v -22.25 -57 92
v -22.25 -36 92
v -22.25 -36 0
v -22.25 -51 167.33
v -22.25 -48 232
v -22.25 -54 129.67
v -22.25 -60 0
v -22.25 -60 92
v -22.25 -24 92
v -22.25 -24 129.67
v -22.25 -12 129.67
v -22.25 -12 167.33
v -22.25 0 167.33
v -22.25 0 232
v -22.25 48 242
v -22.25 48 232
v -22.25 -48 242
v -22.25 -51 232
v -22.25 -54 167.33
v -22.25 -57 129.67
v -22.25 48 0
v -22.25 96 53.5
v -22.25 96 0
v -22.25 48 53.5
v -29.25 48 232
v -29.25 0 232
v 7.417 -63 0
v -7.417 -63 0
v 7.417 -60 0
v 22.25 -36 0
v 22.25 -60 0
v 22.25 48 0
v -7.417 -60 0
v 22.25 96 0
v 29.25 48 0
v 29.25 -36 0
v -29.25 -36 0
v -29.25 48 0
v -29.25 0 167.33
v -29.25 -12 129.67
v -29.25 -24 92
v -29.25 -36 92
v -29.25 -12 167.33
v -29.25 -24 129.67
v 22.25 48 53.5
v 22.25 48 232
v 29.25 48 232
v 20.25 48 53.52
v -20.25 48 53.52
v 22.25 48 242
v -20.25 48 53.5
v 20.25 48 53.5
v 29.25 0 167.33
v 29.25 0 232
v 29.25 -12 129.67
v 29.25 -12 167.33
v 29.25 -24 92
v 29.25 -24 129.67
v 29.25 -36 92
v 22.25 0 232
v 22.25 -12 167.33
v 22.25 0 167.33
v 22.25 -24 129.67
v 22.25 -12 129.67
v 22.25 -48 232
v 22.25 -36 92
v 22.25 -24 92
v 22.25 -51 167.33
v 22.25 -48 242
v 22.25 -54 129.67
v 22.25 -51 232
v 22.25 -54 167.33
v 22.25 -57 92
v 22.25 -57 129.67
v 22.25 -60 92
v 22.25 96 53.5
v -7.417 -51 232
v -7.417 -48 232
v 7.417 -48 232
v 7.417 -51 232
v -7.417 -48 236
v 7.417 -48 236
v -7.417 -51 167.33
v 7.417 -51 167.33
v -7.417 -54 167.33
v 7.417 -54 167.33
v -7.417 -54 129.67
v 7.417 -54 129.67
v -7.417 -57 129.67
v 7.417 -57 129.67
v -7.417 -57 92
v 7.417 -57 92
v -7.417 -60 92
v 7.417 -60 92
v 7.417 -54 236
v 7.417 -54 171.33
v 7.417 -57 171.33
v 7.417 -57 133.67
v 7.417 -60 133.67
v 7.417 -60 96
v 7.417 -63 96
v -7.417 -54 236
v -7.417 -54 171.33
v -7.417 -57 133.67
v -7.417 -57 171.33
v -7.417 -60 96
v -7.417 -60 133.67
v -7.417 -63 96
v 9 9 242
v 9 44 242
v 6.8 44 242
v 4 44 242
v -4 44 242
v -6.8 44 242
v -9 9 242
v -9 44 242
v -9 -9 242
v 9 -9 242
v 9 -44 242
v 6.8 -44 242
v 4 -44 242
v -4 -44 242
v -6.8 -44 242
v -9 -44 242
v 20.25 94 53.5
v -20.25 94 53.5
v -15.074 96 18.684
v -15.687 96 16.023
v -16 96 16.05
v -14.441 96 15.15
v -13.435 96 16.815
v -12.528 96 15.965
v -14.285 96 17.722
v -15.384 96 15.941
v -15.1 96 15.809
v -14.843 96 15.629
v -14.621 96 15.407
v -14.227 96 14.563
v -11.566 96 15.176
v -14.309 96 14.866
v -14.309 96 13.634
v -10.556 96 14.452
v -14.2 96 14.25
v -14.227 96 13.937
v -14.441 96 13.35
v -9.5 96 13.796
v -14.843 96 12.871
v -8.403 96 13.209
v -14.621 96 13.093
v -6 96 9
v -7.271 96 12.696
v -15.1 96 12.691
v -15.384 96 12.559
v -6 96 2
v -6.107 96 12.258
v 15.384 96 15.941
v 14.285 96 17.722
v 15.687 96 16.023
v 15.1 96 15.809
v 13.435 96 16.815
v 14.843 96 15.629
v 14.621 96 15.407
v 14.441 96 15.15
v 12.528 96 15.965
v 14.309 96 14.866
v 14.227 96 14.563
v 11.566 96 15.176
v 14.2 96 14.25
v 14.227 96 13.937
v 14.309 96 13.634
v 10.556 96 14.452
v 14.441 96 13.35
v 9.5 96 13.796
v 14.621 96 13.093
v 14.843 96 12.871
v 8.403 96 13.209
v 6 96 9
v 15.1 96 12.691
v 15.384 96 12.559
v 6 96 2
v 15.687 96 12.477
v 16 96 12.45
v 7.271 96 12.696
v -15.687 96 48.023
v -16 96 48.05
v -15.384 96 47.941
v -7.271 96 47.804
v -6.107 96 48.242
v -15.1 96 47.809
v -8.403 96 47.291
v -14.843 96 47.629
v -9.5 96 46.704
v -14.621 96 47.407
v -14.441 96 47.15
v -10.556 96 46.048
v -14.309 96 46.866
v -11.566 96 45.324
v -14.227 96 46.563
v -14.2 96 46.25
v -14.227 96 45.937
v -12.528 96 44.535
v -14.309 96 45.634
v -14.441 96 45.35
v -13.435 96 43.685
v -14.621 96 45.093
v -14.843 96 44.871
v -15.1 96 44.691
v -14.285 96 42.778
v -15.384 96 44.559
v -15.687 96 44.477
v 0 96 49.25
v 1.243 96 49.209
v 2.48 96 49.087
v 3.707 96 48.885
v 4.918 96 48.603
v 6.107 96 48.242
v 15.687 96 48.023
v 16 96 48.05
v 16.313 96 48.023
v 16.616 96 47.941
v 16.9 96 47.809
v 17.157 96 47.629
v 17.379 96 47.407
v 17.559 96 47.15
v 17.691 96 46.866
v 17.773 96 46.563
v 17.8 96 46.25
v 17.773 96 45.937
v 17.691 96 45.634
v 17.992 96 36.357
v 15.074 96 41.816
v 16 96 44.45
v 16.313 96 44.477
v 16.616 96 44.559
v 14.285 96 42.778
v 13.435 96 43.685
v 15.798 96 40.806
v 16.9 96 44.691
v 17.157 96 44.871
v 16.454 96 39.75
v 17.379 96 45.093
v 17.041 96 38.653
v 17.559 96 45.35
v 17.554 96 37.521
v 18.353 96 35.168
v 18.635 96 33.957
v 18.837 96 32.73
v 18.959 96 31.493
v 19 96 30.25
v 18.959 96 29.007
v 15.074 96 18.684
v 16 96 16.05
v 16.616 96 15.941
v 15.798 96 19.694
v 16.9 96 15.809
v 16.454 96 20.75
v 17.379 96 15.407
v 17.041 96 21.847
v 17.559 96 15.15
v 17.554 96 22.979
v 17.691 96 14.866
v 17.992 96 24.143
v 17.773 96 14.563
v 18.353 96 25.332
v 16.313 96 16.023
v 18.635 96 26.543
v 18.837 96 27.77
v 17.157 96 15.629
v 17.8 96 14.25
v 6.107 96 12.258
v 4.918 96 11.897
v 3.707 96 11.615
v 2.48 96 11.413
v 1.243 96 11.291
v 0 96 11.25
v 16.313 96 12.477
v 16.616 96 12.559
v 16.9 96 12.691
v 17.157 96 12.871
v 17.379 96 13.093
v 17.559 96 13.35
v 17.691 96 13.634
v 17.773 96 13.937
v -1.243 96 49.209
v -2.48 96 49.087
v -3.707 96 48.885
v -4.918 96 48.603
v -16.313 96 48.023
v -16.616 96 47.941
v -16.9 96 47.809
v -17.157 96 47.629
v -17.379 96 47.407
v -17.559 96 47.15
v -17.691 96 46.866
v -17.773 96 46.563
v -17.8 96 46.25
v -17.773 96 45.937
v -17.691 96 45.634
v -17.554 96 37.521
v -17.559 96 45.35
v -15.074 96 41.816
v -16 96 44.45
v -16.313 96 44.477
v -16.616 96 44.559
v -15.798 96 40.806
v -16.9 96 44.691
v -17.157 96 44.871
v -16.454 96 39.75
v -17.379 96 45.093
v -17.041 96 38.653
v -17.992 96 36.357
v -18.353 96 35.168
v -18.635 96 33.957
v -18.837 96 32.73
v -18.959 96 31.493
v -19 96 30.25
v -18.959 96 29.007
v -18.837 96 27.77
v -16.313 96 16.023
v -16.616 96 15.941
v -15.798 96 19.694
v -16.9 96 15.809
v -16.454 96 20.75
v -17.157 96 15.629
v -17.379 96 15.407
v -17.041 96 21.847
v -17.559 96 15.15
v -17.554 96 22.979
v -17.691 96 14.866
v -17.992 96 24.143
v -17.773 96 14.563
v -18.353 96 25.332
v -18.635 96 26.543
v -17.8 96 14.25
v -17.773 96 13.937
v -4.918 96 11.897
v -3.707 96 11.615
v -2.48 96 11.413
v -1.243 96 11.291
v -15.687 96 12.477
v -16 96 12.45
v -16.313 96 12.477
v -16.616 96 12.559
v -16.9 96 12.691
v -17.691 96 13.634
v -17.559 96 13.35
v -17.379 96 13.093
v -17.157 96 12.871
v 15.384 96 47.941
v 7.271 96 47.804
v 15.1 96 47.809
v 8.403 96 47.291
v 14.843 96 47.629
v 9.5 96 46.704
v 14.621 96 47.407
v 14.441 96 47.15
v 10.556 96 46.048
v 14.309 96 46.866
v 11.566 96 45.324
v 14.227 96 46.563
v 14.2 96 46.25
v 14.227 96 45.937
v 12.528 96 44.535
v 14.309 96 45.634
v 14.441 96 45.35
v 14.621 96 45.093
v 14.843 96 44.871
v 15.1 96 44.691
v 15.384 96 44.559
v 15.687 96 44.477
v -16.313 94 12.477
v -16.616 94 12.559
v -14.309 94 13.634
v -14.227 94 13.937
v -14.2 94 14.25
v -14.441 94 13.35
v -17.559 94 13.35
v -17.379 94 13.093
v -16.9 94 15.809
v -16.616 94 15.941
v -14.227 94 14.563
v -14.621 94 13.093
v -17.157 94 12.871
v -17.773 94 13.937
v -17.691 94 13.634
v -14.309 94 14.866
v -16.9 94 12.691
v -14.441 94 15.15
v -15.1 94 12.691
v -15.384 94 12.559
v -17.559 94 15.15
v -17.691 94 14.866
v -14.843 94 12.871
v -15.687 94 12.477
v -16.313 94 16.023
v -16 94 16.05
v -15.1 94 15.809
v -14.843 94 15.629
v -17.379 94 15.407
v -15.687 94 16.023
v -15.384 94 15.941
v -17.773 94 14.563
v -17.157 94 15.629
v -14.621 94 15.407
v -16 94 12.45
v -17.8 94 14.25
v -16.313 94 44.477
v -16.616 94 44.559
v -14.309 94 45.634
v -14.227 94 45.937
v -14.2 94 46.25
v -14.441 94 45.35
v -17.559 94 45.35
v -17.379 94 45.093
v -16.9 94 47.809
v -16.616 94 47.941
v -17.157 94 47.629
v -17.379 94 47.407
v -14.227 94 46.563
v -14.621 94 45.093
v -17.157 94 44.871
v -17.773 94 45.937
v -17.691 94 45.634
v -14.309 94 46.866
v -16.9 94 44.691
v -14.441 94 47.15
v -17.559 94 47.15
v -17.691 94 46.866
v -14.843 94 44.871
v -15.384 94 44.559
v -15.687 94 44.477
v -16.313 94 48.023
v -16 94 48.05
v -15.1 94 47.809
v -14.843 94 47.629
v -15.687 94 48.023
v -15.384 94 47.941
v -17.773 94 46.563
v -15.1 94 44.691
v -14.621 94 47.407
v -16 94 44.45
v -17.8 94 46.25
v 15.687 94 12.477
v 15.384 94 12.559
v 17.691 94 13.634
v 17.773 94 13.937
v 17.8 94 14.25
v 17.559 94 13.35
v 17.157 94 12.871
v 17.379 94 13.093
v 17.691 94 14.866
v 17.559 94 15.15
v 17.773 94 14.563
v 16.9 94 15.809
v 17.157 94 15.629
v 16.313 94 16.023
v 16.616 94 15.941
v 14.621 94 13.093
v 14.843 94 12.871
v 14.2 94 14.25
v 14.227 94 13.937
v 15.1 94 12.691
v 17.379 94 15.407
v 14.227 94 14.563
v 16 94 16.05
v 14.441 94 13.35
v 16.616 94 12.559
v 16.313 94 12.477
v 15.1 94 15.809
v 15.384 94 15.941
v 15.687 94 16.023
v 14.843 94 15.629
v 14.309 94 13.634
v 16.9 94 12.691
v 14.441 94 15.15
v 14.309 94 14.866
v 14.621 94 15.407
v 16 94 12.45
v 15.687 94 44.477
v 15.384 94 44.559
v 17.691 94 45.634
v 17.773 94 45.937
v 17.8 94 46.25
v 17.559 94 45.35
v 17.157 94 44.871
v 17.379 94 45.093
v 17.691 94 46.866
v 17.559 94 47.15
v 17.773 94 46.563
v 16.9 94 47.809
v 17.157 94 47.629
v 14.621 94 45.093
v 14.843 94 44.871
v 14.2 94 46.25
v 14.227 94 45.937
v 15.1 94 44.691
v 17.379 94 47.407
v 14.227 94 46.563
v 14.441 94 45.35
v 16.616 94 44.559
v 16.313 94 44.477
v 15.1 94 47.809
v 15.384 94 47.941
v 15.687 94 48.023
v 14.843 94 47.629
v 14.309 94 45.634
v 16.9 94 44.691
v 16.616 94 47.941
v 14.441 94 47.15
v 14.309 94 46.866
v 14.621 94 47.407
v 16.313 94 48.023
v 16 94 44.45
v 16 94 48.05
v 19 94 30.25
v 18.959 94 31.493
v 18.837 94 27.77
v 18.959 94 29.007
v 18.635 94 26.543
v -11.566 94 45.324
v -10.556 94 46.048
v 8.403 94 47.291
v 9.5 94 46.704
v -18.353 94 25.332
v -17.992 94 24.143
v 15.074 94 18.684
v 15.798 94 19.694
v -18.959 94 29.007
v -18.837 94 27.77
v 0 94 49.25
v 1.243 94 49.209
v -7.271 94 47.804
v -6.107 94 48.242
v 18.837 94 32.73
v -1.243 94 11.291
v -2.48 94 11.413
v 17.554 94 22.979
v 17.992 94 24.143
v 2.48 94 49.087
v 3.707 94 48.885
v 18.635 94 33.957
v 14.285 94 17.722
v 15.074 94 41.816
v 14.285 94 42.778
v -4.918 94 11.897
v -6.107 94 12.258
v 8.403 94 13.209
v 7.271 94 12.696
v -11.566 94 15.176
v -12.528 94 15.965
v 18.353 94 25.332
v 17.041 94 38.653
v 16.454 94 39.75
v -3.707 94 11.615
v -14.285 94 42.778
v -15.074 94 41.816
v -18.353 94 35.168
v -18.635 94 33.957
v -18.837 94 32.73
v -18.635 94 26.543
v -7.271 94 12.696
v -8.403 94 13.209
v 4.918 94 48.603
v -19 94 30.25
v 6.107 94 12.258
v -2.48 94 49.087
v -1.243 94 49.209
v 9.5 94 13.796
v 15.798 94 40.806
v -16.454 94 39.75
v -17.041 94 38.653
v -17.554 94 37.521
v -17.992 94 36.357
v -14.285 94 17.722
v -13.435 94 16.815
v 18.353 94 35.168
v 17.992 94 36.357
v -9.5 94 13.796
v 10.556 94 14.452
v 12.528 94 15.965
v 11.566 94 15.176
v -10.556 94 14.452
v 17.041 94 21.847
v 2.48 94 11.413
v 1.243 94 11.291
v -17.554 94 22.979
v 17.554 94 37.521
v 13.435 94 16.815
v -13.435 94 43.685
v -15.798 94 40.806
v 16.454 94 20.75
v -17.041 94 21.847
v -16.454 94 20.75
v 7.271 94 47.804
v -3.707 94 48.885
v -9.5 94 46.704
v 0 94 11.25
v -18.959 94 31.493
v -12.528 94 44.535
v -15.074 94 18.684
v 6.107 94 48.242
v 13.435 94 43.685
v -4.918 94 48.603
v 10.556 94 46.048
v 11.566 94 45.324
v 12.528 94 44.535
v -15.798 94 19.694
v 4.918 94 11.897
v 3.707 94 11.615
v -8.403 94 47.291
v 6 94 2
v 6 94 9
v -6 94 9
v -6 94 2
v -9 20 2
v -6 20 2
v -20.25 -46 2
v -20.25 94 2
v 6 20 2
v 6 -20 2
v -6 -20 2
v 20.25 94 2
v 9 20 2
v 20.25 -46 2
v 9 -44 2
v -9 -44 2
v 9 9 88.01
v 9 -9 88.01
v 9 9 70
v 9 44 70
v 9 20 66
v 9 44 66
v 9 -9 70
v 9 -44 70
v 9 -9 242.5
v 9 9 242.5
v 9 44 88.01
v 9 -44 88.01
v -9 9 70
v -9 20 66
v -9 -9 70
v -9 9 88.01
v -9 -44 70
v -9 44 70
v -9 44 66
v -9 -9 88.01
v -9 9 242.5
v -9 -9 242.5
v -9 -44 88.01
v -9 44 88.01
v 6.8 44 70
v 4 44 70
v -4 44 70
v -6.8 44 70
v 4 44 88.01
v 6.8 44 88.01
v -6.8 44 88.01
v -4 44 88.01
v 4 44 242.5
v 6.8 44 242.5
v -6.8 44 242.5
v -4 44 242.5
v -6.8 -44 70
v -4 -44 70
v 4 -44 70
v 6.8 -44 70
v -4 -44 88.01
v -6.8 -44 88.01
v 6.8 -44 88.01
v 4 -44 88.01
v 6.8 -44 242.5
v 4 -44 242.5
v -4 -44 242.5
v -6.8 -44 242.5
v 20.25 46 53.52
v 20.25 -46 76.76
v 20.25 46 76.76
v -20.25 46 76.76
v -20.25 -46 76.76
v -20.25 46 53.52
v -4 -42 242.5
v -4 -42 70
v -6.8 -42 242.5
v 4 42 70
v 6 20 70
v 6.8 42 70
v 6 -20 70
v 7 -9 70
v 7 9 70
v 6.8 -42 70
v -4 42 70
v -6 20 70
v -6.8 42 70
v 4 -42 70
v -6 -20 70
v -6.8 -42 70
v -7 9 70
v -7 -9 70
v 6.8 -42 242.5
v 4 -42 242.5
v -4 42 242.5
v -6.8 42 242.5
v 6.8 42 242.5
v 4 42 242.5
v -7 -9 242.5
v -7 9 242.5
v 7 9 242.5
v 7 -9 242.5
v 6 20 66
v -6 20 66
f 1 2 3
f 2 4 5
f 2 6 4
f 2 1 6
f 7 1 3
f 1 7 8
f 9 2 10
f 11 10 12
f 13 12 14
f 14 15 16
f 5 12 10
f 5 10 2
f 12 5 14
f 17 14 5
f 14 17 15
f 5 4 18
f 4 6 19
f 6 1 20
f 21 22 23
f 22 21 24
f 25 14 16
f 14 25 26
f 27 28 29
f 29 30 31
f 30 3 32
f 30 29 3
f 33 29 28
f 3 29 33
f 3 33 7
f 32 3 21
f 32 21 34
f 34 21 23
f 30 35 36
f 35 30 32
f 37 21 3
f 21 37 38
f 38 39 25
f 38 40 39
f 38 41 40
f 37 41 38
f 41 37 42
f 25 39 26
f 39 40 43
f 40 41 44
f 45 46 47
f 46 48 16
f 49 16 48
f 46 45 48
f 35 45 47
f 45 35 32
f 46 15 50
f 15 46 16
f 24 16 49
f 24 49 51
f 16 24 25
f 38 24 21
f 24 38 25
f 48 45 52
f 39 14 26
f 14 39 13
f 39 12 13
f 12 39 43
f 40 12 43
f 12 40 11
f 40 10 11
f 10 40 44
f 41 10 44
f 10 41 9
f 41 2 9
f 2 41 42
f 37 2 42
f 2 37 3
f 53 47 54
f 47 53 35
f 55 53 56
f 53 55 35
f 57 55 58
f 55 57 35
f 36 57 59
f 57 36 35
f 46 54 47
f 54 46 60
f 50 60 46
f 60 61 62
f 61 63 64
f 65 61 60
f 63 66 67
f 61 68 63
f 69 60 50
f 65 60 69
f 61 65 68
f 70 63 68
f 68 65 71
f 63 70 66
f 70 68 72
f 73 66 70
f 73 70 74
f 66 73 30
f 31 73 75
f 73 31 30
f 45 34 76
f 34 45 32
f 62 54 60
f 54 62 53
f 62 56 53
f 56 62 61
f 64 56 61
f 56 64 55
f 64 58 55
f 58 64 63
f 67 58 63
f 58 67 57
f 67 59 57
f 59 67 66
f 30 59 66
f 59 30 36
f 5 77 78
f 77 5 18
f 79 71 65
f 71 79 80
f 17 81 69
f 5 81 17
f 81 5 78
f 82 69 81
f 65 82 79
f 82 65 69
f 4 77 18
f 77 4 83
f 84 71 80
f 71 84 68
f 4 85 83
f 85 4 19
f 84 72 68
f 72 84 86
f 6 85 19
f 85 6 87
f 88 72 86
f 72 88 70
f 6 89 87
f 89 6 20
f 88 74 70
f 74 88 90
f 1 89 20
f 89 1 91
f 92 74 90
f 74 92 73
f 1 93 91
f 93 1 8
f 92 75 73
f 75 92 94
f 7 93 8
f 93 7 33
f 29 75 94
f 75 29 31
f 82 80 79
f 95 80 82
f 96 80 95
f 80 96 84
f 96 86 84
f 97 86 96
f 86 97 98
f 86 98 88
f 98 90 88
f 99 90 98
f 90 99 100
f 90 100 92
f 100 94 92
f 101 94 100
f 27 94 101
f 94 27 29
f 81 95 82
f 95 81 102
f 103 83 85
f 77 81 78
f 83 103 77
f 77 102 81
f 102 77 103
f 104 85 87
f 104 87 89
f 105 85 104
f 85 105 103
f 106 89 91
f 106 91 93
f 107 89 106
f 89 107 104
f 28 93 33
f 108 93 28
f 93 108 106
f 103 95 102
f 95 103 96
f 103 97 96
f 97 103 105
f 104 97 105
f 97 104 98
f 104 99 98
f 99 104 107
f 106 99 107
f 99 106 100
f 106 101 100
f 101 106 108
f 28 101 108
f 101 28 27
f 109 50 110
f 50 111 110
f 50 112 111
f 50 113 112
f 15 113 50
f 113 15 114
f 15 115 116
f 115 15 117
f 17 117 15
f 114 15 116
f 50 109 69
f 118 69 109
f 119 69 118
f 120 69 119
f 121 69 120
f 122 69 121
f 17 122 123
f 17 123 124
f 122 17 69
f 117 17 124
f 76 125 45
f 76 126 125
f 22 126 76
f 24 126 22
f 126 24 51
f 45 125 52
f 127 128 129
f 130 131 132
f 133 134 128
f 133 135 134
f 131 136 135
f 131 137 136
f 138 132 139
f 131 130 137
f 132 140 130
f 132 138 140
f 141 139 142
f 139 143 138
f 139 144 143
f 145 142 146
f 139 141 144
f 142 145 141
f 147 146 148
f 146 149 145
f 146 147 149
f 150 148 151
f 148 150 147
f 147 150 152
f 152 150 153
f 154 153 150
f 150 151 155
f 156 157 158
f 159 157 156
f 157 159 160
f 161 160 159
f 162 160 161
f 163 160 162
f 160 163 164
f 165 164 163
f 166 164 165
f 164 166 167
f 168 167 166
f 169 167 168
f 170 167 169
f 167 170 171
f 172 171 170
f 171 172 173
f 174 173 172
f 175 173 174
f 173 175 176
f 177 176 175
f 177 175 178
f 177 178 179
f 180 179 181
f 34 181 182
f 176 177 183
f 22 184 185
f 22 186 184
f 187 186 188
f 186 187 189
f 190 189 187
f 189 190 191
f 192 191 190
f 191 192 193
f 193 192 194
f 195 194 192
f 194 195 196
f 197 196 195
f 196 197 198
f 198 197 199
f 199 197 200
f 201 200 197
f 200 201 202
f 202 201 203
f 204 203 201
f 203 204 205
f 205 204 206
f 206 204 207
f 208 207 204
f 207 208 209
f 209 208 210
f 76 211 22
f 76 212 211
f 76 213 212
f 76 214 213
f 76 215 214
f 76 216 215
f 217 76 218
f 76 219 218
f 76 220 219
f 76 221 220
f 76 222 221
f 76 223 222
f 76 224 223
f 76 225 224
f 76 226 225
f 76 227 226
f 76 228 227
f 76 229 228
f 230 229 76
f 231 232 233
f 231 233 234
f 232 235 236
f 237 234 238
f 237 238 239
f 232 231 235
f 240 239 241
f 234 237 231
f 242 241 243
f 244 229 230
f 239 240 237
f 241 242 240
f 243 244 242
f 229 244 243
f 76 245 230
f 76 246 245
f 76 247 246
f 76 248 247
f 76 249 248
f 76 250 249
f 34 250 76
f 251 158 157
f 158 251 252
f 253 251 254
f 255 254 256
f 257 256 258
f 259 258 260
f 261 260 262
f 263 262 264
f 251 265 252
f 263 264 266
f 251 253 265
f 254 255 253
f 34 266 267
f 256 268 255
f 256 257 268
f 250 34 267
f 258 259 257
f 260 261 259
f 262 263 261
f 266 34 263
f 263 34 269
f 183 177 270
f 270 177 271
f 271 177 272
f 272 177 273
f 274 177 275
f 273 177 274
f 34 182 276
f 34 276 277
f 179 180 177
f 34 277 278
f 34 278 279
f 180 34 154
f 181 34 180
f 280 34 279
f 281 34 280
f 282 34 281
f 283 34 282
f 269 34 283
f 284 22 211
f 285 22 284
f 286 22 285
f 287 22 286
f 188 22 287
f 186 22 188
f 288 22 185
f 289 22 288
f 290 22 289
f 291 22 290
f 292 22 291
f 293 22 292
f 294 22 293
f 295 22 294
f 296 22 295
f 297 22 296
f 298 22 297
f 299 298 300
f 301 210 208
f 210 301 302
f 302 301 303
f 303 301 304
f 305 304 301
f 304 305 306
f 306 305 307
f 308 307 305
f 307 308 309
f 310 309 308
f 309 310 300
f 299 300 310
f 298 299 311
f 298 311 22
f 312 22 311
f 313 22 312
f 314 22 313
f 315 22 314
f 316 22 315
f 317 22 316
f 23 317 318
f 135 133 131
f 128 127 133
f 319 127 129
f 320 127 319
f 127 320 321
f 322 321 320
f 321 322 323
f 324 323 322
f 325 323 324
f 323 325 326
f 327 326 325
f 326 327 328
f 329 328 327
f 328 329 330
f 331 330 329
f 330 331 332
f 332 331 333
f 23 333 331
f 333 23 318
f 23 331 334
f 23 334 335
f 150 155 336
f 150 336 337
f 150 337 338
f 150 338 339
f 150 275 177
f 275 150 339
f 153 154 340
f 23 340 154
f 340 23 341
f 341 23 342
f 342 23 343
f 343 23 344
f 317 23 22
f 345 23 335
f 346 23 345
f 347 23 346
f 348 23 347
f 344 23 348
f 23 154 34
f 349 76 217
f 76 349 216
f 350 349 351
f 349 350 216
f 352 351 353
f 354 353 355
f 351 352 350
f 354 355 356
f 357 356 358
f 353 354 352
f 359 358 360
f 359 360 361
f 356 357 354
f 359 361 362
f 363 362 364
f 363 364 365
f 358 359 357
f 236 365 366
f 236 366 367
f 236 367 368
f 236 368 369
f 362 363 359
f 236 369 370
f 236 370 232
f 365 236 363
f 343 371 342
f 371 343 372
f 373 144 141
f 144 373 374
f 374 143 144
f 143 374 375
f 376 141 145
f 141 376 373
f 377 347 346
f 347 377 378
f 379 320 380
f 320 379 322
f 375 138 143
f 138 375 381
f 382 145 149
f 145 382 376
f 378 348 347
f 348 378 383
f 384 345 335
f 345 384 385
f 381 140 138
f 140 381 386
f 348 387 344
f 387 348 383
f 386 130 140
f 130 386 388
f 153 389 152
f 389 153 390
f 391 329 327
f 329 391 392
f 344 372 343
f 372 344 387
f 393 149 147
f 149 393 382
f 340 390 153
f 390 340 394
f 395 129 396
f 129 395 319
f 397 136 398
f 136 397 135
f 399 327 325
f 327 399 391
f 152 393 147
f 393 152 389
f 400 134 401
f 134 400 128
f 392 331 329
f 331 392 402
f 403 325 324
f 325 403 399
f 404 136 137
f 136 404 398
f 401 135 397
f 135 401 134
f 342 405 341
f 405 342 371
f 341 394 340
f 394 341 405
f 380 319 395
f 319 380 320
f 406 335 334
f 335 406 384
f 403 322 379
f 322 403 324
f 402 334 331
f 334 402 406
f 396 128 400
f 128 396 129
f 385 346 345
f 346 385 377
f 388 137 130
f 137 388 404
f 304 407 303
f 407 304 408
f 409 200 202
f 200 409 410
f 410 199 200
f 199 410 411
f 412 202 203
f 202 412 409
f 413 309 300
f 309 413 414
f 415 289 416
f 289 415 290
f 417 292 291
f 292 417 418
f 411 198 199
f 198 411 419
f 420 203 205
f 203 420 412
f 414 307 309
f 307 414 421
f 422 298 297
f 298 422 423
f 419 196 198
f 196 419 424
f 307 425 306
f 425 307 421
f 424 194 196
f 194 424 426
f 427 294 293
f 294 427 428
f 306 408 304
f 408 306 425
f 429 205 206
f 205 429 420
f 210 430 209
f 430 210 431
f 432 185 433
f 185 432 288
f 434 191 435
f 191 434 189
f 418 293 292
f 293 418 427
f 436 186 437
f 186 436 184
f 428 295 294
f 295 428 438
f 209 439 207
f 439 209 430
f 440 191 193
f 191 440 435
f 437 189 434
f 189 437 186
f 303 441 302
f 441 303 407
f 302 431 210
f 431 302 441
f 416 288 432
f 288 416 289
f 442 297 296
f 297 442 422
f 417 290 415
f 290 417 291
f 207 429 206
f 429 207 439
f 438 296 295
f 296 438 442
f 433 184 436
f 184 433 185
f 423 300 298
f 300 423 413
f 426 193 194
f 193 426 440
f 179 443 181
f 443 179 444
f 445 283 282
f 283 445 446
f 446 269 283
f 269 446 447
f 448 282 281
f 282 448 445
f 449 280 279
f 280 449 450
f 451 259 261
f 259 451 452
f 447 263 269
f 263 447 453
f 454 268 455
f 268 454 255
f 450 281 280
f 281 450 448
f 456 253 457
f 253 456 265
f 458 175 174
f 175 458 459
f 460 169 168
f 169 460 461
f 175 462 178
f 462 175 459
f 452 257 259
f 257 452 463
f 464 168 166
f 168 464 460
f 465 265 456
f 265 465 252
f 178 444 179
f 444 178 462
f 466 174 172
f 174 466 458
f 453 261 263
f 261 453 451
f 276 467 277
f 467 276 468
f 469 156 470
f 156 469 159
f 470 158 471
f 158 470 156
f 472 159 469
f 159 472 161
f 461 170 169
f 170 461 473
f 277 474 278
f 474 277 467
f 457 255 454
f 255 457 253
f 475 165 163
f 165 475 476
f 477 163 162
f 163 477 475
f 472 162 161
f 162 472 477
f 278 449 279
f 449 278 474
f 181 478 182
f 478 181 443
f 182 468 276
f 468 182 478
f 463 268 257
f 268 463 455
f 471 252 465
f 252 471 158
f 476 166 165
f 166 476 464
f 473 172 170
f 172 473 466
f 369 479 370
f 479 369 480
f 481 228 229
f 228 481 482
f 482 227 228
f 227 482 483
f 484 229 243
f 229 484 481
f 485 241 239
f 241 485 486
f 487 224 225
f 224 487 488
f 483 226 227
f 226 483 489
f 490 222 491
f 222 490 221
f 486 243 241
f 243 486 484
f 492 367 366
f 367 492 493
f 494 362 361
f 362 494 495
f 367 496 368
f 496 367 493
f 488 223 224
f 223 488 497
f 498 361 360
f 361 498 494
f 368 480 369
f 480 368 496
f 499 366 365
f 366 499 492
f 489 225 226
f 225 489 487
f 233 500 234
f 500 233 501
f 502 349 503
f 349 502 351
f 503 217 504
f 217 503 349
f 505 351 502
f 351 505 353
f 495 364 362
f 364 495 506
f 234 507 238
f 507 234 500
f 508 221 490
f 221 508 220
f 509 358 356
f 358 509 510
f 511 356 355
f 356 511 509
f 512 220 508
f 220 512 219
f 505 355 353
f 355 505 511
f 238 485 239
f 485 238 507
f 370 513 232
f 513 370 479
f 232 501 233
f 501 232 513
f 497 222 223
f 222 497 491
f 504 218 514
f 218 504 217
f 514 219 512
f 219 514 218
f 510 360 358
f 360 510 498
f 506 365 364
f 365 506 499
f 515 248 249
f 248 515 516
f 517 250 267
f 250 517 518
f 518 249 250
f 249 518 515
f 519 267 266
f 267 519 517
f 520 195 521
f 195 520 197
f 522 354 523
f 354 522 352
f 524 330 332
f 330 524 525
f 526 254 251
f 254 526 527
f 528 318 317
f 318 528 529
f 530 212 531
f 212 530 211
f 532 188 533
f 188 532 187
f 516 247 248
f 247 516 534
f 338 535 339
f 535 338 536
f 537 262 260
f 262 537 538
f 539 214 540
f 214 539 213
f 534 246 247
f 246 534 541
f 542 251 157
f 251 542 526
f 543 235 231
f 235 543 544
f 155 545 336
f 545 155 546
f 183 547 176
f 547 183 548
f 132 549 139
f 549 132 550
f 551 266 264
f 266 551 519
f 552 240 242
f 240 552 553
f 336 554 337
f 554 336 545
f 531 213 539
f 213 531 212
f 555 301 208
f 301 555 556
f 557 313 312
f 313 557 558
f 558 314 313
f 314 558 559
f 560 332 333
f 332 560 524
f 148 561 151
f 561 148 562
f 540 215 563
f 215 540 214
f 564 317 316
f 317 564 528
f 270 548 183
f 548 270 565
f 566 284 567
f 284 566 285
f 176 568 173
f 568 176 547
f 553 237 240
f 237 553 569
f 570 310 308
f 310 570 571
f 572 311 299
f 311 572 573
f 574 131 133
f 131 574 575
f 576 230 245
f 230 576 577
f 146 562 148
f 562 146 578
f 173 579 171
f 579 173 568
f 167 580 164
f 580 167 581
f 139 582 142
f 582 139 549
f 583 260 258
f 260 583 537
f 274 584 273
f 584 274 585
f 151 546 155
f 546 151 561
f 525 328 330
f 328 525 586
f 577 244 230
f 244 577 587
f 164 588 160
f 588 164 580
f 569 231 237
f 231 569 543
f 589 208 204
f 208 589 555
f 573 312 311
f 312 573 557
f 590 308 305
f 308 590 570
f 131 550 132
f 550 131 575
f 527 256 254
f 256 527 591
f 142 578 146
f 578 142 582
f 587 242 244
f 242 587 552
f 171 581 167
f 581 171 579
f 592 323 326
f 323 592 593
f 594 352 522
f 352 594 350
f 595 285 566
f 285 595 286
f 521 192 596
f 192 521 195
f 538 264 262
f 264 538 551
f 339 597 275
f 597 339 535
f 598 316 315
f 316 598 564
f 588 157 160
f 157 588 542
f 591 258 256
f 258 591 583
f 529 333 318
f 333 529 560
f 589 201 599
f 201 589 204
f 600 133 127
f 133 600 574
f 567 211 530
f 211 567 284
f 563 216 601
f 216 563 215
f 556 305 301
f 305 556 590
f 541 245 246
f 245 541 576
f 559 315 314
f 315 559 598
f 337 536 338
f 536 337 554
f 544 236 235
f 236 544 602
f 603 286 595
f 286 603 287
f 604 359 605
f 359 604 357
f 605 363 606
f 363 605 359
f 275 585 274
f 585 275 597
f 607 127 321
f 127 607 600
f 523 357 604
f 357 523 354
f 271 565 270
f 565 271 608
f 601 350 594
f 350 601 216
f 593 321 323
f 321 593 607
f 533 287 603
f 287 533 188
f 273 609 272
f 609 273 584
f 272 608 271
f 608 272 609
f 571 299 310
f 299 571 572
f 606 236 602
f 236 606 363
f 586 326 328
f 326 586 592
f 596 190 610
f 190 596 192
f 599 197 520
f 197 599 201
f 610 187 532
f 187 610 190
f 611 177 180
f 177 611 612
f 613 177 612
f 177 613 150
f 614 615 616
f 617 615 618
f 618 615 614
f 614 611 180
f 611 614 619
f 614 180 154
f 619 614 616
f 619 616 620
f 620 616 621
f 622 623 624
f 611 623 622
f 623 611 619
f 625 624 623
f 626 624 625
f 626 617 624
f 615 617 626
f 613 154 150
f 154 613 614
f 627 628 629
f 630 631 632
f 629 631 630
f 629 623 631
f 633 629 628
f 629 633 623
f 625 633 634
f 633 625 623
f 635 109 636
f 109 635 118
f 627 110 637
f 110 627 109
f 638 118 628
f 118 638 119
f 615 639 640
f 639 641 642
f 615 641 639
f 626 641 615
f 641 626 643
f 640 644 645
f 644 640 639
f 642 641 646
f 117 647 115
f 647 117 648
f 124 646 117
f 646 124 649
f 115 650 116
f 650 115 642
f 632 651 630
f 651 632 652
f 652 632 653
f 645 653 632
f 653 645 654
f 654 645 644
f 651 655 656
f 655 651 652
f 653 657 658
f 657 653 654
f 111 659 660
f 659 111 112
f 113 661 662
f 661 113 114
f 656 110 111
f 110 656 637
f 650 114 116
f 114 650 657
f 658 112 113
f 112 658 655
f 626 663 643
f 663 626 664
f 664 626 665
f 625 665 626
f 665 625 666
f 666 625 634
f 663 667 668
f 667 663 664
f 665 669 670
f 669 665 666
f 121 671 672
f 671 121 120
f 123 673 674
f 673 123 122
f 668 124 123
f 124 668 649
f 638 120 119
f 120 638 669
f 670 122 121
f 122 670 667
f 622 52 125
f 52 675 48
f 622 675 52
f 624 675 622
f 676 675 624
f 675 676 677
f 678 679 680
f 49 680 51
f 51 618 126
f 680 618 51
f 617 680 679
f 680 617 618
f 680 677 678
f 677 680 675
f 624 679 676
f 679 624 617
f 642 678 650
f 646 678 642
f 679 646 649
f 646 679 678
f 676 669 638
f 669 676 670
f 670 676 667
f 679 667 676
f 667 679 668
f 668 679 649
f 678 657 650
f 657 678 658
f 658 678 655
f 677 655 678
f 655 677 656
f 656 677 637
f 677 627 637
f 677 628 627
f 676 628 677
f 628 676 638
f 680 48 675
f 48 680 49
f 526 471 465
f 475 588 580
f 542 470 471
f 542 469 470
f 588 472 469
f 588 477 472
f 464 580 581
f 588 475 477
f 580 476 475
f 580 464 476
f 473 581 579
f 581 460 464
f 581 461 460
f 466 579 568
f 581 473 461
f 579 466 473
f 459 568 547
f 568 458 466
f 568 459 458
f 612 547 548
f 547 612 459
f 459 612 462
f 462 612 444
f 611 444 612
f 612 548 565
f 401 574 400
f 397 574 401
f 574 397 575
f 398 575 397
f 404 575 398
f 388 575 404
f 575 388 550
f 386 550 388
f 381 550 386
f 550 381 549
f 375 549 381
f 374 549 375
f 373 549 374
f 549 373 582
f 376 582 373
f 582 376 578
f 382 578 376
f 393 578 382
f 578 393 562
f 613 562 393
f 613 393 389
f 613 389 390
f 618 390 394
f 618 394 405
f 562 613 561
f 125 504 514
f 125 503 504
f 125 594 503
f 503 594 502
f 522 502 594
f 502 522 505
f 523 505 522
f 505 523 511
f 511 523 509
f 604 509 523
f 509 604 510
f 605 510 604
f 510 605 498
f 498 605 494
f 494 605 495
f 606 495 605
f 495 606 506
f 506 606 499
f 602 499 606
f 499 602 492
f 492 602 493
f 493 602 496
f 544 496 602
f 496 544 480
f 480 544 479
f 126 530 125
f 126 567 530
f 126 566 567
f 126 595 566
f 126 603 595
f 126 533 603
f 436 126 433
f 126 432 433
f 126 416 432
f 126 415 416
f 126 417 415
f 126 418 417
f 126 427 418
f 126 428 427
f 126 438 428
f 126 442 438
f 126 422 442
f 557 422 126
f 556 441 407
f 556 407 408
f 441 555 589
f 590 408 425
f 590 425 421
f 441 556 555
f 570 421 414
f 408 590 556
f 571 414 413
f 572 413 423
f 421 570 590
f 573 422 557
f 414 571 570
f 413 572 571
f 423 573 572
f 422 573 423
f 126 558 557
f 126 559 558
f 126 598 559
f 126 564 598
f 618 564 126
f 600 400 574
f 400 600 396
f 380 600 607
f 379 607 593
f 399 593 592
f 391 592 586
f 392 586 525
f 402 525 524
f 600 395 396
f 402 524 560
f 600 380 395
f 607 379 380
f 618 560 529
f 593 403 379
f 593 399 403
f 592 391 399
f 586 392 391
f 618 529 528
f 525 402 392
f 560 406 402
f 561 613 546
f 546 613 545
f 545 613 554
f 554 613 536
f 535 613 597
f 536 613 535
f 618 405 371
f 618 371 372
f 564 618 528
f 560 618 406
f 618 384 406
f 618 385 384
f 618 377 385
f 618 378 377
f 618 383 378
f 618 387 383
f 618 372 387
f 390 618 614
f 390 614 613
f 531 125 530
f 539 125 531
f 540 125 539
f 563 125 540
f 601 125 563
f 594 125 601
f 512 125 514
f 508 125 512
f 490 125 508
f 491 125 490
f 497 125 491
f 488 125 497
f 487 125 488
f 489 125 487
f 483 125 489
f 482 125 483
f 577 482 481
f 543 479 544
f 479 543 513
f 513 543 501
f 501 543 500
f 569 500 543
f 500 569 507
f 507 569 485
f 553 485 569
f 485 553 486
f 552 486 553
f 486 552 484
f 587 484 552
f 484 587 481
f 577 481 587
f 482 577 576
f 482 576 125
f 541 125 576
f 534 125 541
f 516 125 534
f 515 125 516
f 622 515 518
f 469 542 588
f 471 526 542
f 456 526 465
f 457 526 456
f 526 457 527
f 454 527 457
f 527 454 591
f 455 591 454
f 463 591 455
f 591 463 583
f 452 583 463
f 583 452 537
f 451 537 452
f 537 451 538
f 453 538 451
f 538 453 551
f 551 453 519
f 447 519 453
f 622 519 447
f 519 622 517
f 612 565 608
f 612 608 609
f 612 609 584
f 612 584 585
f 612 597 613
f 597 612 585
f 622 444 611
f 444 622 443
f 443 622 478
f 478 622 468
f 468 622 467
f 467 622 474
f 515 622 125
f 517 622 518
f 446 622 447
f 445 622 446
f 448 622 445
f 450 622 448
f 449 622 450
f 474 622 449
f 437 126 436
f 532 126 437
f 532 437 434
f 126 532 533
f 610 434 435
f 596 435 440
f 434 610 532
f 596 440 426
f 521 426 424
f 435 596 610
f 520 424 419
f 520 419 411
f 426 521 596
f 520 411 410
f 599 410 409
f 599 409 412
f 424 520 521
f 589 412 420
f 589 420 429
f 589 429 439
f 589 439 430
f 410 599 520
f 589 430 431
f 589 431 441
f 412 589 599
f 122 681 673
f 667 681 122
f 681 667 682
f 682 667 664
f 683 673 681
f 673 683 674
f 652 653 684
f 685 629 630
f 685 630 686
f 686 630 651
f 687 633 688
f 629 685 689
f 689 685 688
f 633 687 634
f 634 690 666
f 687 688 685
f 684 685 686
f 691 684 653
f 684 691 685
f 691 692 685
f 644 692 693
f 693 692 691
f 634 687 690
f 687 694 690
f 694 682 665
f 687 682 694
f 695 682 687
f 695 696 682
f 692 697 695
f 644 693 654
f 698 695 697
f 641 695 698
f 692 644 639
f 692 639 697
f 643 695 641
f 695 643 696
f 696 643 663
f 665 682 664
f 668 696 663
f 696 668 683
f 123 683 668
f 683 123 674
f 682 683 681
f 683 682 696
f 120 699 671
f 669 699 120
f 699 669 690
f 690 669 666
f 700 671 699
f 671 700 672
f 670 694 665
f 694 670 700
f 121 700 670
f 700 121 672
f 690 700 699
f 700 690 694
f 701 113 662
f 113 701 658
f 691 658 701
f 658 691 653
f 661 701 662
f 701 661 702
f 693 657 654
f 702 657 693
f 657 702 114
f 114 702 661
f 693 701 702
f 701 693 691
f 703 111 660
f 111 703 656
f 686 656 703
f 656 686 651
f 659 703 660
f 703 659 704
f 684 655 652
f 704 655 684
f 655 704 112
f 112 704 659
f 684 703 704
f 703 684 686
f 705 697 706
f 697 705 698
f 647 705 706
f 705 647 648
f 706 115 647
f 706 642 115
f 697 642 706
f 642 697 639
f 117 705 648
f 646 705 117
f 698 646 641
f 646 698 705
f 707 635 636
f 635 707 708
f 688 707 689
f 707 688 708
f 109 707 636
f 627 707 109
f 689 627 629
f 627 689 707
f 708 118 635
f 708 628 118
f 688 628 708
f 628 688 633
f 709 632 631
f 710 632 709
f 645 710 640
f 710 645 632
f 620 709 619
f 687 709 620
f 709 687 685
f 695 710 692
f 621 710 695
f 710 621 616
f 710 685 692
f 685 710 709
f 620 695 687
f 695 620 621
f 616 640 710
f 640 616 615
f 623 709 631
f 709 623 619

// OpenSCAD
// file: lib/defaults.scad
// old_rca_building defaults (all dimensions in mm).
// Revision target: maximum-simplification L-shape prototype.
//
// Coordinate convention:
// - X: left/right
// - Y: front/back
// - Z: vertical

// Part selector
// 0 = final model
// 1 = outer mass only
// 2 = negative cutters (debug)
// 3 = internal supports only
// 4 = lower split section (below split_z)
// 5 = upper split section (at/above split_z)
// 6 = removable wing-roof insert (print separately)
part_id = 0;

// Printer/process assumptions
wall = 2.0;
floor = 2.0;
debug_open_bottom = 0; // 1 = temporary debug mode to remove bottom surfaces (open from below)

// Device envelope constraints
phone_h_max = 163.6;
phone_w_max = 78.1;
phone_t_max = 8.9;
side_gap_min = 3.5;
face_gap_min = 3.0;
top_clearance_min = 8.0;
overall_height_max = 215.0; // keep each split print piece <= 220 mm build limit with ~5 mm margin

// Fan interface (40 mm reference)
fan_frame = 40.0;
fan_hole_spacing = 32.0;
fan_hole_d = 3.6;
fan_square_opening = 40.5; // frame-clearance reference size used for compact bump-out envelope sizing
fan_intake_d = 38.0; // central airflow opening in the mounting plate (keeps corner screw-hole land)

// Cable slot below fan (sealable with hot glue)
rear_cable_slot_w = 12.0;
rear_cable_slot_h = 7.0;

// Tower + base-wing massing (simple L shape in plan)
tower_x = 44.5; // must remain >= fan_frame
tower_y = 96.0;
tower_z = 242.0; // support_z + phone_h_max + top_clearance_min, rounded

base_z = 88.0; // tower lower plenum height
tower_inner_roof_bevel = 0.0; // 0 = auto full-depth 45 deg inverse bevel from opening to walls
wing_vault_radius = 0.0; // legacy parameter; vault cut is disabled in current flat-roof bump-out
bump_margin = 2.0; // desired minimum envelope margin around fan/USB features
wing_x = fan_square_opening + 2 * bump_margin; // no extra side space beside fan opening
wing_y = 53.6; // gives exposed bump-out length of 48.0 with 5.6 overlap (tower:bump-out = 2:1)
wing_z = fan_square_opening + rear_cable_slot_h + 3 * bump_margin; // no extra above fan or below USB slot
wing_overlap_y = 5.6; // overlap in Y between tower and wing
wing_attach_side = 1; // +1 = +Y side, -1 = -Y side

// Simplified facade: side-only tiered setbacks (no window/ornament detail).
side_setback_enable = 1;
side_setback_step = 7.0; // uniform protrusion distance for each tier
front_setback_enable = 1;
front_setback_step = 3.0; // cumulative front-face protrusion by tier: 3, 6, 9, 12 mm
front_center_setback_enable = 1;
front_center_setback_step = 3.0; // cumulative center-front protrusion by tier: 3, 6, 9, 12 mm
front_center_extra_protrusion = 3.0; // extra protrusion beyond primary front tiers at each matching tier
front_center_x_start_frac = 1.0 / 3.0; // centered tier band starts at 1/3 facade width
front_center_x_end_frac = 2.0 / 3.0; // centered tier band ends at 2/3 facade width
front_center_tier_height_boost = 4.0; // each center-front tier top is this much higher than base front tier tops
side_top_tier_top_gap = 10.0; // keep top tier below tower top by this amount
side_tier2_center_to_front_frac = 0.25; // 25% from center toward front
side_tier3_center_to_front_frac = 0.50; // 50% from center toward front
side_tier4_center_to_front_frac = 0.75; // 75% from center toward front
side_left_tier0_z = 0.0; // tier base at model floor
side_left_tier1_z = 92.0;
side_left_tier2_z = 129.67; // normalized middle tier top
side_left_tier3_z = 167.33; // normalized middle tier top
side_right_tier0_z = 0.0; // mirrored to left, tier base at model floor
side_right_tier1_z = 92.0; // mirrored to left
side_right_tier2_z = 129.67; // mirrored to left
side_right_tier3_z = 167.33; // mirrored to left

// Phone void rotated 90 deg around Z from prior draft:
// - narrow axis in X (phone thickness + face gaps)
// - wide axis in Y (phone width + side gaps)
void_x = 18.0;
void_y = 88.0;
void_center_x = 0.0;
void_center_y = 0.0;
tower_top_lip_h = 0.0; // through-cut void to top; set 0 to avoid partial top-lip overhang
support_z = 70.0; // keep >= 70 and maximize enclosed phone depth under height cap

// Rails (2 on front wall + 2 on back wall + 1 on each wide-side wall)
rail_inset_from_x_ends = 2.2;
rail_width_x = 2.8;
rail_protrusion_y = 2.0;
rail_side_protrusion_x = 2.0;
rail_side_span_y = 18.0;
rail_phone_margin_min = 2.0;

// Bottom cage with center cable bend window
cage_bar_h = 4.0;
cable_window_x = 12.0;
cable_window_y = 40.0;
split_z = support_z - cage_bar_h; // horizontal split plane: upper section starts at phone-holder base floor

// Removable wing-roof insert (for support-free wing cavity printing)
roof_insert_clearance = 0.30; // fit clearance to inner wing opening
roof_insert_plate_h = wall; // roof panel thickness
roof_insert_lip_t = 1.2; // lip thickness on non-fan edges
roof_insert_lip_h = 4.0; // lip depth into cavity
roof_insert_lip_inset = 0.8; // inset tabs from panel perimeter so they can enter opening

// Fan/cable placement derived from compact bump-out envelope rules.
fan_center_x = 0.0;
fan_center_z = rear_cable_slot_h + 1.5 * bump_margin + fan_square_opening / 2;

rear_cable_slot_center_x = fan_center_x;
rear_cable_slot_center_z = bump_margin + rear_cable_slot_h / 2;
// main file
// Entry point for scripted exports.
// Usage:
//   openscad -o out.stl designs/old_rca_building/src/main.scad -D part_id=0 ...

include <lib/defaults.scad>;
include <parts/old_rca_building.scad>;

_part_id = is_undef(part_id) ? 0 : part_id;

if (_part_id == 0) {
  old_rca_building_model();
} else if (_part_id == 1) {
  old_rca_building_outer_mass();
} else if (_part_id == 2) {
  old_rca_building_negative_cuts();
} else if (_part_id == 3) {
  old_rca_building_internal_supports();
} else if (_part_id == 4) {
  old_rca_building_split_lower();
} else if (_part_id == 5) {
  old_rca_building_split_upper();
} else if (_part_id == 6) {
  old_rca_building_wing_roof_insert();
} else {
  assert(false, str("Unknown part_id: ", _part_id));
}
